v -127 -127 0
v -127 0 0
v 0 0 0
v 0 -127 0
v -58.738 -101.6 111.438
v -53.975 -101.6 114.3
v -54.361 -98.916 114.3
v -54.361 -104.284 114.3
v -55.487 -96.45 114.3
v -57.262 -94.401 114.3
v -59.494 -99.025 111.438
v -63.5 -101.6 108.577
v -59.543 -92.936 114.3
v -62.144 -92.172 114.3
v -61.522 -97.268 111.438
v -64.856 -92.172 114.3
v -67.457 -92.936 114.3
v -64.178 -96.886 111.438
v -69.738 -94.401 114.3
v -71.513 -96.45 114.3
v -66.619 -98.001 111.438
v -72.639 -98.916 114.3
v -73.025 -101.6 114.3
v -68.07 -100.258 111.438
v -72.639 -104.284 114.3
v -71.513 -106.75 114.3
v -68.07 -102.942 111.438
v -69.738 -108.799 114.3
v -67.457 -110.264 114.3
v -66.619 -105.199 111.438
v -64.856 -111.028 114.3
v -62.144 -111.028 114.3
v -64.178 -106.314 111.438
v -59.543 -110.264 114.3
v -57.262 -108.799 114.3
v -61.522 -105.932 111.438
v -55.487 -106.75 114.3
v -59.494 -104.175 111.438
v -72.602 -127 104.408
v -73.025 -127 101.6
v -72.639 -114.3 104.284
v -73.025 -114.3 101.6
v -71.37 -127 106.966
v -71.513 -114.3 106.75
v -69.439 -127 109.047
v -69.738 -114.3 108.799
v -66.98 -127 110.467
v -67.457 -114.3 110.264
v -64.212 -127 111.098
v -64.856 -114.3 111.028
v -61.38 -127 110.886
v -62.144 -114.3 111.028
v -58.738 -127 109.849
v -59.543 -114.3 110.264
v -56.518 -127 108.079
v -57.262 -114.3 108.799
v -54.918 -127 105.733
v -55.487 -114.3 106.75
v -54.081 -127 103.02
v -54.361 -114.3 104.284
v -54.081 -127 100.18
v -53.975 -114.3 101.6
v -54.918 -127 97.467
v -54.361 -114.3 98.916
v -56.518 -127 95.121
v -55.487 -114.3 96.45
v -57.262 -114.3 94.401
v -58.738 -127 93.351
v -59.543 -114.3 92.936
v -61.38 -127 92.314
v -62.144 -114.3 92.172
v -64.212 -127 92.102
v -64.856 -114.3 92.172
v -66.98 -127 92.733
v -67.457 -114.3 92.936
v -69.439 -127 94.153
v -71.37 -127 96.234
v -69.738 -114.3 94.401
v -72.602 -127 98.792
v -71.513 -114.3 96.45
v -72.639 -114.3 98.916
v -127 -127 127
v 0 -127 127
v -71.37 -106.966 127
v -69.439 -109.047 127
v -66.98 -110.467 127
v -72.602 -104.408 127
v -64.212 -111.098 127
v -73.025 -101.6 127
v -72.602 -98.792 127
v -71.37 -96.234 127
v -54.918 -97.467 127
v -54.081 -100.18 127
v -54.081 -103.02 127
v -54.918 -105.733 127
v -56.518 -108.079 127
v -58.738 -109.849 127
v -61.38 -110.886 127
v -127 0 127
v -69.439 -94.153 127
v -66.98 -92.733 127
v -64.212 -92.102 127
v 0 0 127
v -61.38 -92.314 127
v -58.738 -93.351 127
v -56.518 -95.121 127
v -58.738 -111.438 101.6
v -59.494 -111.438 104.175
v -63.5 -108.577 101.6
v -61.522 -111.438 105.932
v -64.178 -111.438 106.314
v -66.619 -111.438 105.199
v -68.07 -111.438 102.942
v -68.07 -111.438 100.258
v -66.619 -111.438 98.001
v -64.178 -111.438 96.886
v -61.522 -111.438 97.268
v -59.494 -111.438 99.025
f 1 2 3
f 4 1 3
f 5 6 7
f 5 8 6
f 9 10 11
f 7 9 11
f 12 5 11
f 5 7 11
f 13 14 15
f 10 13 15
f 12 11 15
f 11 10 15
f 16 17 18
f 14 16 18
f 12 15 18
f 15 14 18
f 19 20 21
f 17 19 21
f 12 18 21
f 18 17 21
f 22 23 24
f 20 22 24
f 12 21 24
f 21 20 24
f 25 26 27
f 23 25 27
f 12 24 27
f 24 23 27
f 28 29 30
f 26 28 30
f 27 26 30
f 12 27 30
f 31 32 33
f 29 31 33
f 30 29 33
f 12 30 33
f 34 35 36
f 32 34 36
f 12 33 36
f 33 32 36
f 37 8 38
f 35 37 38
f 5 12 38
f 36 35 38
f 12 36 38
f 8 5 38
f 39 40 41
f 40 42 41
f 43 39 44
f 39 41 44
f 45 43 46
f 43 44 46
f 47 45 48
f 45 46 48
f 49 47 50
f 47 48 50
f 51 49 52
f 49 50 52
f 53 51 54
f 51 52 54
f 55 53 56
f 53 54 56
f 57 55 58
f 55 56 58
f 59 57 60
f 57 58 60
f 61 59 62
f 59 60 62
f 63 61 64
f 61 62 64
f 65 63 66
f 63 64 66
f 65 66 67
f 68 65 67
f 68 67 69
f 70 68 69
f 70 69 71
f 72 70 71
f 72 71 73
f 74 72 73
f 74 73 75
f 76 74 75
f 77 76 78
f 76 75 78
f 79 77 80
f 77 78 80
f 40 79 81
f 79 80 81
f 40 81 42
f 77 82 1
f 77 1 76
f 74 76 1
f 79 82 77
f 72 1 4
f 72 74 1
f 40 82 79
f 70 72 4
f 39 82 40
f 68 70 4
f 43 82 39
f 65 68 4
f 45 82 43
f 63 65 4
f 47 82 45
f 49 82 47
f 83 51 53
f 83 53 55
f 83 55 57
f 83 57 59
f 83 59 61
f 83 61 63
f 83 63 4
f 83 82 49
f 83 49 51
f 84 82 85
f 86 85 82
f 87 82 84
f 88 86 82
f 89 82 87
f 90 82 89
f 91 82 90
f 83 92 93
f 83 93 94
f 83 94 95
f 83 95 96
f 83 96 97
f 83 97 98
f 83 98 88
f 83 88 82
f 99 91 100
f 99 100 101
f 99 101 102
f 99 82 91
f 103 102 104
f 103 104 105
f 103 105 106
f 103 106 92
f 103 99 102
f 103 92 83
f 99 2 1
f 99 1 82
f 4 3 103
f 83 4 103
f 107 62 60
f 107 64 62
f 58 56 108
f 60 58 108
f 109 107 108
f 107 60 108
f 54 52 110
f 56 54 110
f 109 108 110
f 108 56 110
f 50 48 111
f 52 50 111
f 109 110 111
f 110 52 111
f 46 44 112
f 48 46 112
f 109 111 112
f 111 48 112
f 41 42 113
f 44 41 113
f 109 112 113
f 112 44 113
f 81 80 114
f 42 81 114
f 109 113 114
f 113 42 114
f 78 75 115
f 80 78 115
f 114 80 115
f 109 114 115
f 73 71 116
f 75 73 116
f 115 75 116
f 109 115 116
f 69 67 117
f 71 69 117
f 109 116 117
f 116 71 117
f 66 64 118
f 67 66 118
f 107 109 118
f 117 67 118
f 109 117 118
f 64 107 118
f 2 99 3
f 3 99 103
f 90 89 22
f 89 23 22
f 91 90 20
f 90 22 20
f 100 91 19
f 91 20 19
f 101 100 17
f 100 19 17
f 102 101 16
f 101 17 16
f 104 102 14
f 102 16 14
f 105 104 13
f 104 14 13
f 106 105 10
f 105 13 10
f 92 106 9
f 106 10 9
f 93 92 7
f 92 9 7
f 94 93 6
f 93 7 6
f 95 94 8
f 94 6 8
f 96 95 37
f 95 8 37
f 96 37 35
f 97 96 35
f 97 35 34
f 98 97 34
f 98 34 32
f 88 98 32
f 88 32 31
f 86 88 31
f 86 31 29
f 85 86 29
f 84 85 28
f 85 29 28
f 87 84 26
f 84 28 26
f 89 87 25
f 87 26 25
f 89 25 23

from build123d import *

# Parameters (mm, degrees)
F0_W     = 127
F0_H     = 127
F1_DEPTH = 127
F3_D     = 19.05
F3_DEPTH = 12.7
F3_TIP   = 5.7231973962
F5_D     = 19.05
F5_DEPTH = 12.7
F5_TIP   = 5.7231973962


with BuildPart() as f1:
    # F0 (on Front) → F1 (new body)
    with BuildSketch(Plane.XZ):
        with Locations((-63.5, 63.5)):
            Rectangle(F0_W, F0_H)
    extrude(amount=F1_DEPTH)

    # F3
    with Locations(Plane.XZ.offset(127)):
        with Locations((-63.5, 101.6)):
            Hole(F3_D / 2, depth=F3_DEPTH)
            with Locations((0, 0, -(F3_DEPTH + F3_TIP / 2))):  # 118° drill point
                Cone(0, F3_D / 2, F3_TIP, mode=Mode.SUBTRACT)

    # F5
    with Locations(Plane.XY.offset(127)):
        with Locations((-63.5, -101.6)):
            Hole(F5_D / 2, depth=F5_DEPTH)
            with Locations((0, 0, -(F5_DEPTH + F5_TIP / 2))):  # 118° drill point
                Cone(0, F5_D / 2, F5_TIP, mode=Mode.SUBTRACT)


solid = f1.part
